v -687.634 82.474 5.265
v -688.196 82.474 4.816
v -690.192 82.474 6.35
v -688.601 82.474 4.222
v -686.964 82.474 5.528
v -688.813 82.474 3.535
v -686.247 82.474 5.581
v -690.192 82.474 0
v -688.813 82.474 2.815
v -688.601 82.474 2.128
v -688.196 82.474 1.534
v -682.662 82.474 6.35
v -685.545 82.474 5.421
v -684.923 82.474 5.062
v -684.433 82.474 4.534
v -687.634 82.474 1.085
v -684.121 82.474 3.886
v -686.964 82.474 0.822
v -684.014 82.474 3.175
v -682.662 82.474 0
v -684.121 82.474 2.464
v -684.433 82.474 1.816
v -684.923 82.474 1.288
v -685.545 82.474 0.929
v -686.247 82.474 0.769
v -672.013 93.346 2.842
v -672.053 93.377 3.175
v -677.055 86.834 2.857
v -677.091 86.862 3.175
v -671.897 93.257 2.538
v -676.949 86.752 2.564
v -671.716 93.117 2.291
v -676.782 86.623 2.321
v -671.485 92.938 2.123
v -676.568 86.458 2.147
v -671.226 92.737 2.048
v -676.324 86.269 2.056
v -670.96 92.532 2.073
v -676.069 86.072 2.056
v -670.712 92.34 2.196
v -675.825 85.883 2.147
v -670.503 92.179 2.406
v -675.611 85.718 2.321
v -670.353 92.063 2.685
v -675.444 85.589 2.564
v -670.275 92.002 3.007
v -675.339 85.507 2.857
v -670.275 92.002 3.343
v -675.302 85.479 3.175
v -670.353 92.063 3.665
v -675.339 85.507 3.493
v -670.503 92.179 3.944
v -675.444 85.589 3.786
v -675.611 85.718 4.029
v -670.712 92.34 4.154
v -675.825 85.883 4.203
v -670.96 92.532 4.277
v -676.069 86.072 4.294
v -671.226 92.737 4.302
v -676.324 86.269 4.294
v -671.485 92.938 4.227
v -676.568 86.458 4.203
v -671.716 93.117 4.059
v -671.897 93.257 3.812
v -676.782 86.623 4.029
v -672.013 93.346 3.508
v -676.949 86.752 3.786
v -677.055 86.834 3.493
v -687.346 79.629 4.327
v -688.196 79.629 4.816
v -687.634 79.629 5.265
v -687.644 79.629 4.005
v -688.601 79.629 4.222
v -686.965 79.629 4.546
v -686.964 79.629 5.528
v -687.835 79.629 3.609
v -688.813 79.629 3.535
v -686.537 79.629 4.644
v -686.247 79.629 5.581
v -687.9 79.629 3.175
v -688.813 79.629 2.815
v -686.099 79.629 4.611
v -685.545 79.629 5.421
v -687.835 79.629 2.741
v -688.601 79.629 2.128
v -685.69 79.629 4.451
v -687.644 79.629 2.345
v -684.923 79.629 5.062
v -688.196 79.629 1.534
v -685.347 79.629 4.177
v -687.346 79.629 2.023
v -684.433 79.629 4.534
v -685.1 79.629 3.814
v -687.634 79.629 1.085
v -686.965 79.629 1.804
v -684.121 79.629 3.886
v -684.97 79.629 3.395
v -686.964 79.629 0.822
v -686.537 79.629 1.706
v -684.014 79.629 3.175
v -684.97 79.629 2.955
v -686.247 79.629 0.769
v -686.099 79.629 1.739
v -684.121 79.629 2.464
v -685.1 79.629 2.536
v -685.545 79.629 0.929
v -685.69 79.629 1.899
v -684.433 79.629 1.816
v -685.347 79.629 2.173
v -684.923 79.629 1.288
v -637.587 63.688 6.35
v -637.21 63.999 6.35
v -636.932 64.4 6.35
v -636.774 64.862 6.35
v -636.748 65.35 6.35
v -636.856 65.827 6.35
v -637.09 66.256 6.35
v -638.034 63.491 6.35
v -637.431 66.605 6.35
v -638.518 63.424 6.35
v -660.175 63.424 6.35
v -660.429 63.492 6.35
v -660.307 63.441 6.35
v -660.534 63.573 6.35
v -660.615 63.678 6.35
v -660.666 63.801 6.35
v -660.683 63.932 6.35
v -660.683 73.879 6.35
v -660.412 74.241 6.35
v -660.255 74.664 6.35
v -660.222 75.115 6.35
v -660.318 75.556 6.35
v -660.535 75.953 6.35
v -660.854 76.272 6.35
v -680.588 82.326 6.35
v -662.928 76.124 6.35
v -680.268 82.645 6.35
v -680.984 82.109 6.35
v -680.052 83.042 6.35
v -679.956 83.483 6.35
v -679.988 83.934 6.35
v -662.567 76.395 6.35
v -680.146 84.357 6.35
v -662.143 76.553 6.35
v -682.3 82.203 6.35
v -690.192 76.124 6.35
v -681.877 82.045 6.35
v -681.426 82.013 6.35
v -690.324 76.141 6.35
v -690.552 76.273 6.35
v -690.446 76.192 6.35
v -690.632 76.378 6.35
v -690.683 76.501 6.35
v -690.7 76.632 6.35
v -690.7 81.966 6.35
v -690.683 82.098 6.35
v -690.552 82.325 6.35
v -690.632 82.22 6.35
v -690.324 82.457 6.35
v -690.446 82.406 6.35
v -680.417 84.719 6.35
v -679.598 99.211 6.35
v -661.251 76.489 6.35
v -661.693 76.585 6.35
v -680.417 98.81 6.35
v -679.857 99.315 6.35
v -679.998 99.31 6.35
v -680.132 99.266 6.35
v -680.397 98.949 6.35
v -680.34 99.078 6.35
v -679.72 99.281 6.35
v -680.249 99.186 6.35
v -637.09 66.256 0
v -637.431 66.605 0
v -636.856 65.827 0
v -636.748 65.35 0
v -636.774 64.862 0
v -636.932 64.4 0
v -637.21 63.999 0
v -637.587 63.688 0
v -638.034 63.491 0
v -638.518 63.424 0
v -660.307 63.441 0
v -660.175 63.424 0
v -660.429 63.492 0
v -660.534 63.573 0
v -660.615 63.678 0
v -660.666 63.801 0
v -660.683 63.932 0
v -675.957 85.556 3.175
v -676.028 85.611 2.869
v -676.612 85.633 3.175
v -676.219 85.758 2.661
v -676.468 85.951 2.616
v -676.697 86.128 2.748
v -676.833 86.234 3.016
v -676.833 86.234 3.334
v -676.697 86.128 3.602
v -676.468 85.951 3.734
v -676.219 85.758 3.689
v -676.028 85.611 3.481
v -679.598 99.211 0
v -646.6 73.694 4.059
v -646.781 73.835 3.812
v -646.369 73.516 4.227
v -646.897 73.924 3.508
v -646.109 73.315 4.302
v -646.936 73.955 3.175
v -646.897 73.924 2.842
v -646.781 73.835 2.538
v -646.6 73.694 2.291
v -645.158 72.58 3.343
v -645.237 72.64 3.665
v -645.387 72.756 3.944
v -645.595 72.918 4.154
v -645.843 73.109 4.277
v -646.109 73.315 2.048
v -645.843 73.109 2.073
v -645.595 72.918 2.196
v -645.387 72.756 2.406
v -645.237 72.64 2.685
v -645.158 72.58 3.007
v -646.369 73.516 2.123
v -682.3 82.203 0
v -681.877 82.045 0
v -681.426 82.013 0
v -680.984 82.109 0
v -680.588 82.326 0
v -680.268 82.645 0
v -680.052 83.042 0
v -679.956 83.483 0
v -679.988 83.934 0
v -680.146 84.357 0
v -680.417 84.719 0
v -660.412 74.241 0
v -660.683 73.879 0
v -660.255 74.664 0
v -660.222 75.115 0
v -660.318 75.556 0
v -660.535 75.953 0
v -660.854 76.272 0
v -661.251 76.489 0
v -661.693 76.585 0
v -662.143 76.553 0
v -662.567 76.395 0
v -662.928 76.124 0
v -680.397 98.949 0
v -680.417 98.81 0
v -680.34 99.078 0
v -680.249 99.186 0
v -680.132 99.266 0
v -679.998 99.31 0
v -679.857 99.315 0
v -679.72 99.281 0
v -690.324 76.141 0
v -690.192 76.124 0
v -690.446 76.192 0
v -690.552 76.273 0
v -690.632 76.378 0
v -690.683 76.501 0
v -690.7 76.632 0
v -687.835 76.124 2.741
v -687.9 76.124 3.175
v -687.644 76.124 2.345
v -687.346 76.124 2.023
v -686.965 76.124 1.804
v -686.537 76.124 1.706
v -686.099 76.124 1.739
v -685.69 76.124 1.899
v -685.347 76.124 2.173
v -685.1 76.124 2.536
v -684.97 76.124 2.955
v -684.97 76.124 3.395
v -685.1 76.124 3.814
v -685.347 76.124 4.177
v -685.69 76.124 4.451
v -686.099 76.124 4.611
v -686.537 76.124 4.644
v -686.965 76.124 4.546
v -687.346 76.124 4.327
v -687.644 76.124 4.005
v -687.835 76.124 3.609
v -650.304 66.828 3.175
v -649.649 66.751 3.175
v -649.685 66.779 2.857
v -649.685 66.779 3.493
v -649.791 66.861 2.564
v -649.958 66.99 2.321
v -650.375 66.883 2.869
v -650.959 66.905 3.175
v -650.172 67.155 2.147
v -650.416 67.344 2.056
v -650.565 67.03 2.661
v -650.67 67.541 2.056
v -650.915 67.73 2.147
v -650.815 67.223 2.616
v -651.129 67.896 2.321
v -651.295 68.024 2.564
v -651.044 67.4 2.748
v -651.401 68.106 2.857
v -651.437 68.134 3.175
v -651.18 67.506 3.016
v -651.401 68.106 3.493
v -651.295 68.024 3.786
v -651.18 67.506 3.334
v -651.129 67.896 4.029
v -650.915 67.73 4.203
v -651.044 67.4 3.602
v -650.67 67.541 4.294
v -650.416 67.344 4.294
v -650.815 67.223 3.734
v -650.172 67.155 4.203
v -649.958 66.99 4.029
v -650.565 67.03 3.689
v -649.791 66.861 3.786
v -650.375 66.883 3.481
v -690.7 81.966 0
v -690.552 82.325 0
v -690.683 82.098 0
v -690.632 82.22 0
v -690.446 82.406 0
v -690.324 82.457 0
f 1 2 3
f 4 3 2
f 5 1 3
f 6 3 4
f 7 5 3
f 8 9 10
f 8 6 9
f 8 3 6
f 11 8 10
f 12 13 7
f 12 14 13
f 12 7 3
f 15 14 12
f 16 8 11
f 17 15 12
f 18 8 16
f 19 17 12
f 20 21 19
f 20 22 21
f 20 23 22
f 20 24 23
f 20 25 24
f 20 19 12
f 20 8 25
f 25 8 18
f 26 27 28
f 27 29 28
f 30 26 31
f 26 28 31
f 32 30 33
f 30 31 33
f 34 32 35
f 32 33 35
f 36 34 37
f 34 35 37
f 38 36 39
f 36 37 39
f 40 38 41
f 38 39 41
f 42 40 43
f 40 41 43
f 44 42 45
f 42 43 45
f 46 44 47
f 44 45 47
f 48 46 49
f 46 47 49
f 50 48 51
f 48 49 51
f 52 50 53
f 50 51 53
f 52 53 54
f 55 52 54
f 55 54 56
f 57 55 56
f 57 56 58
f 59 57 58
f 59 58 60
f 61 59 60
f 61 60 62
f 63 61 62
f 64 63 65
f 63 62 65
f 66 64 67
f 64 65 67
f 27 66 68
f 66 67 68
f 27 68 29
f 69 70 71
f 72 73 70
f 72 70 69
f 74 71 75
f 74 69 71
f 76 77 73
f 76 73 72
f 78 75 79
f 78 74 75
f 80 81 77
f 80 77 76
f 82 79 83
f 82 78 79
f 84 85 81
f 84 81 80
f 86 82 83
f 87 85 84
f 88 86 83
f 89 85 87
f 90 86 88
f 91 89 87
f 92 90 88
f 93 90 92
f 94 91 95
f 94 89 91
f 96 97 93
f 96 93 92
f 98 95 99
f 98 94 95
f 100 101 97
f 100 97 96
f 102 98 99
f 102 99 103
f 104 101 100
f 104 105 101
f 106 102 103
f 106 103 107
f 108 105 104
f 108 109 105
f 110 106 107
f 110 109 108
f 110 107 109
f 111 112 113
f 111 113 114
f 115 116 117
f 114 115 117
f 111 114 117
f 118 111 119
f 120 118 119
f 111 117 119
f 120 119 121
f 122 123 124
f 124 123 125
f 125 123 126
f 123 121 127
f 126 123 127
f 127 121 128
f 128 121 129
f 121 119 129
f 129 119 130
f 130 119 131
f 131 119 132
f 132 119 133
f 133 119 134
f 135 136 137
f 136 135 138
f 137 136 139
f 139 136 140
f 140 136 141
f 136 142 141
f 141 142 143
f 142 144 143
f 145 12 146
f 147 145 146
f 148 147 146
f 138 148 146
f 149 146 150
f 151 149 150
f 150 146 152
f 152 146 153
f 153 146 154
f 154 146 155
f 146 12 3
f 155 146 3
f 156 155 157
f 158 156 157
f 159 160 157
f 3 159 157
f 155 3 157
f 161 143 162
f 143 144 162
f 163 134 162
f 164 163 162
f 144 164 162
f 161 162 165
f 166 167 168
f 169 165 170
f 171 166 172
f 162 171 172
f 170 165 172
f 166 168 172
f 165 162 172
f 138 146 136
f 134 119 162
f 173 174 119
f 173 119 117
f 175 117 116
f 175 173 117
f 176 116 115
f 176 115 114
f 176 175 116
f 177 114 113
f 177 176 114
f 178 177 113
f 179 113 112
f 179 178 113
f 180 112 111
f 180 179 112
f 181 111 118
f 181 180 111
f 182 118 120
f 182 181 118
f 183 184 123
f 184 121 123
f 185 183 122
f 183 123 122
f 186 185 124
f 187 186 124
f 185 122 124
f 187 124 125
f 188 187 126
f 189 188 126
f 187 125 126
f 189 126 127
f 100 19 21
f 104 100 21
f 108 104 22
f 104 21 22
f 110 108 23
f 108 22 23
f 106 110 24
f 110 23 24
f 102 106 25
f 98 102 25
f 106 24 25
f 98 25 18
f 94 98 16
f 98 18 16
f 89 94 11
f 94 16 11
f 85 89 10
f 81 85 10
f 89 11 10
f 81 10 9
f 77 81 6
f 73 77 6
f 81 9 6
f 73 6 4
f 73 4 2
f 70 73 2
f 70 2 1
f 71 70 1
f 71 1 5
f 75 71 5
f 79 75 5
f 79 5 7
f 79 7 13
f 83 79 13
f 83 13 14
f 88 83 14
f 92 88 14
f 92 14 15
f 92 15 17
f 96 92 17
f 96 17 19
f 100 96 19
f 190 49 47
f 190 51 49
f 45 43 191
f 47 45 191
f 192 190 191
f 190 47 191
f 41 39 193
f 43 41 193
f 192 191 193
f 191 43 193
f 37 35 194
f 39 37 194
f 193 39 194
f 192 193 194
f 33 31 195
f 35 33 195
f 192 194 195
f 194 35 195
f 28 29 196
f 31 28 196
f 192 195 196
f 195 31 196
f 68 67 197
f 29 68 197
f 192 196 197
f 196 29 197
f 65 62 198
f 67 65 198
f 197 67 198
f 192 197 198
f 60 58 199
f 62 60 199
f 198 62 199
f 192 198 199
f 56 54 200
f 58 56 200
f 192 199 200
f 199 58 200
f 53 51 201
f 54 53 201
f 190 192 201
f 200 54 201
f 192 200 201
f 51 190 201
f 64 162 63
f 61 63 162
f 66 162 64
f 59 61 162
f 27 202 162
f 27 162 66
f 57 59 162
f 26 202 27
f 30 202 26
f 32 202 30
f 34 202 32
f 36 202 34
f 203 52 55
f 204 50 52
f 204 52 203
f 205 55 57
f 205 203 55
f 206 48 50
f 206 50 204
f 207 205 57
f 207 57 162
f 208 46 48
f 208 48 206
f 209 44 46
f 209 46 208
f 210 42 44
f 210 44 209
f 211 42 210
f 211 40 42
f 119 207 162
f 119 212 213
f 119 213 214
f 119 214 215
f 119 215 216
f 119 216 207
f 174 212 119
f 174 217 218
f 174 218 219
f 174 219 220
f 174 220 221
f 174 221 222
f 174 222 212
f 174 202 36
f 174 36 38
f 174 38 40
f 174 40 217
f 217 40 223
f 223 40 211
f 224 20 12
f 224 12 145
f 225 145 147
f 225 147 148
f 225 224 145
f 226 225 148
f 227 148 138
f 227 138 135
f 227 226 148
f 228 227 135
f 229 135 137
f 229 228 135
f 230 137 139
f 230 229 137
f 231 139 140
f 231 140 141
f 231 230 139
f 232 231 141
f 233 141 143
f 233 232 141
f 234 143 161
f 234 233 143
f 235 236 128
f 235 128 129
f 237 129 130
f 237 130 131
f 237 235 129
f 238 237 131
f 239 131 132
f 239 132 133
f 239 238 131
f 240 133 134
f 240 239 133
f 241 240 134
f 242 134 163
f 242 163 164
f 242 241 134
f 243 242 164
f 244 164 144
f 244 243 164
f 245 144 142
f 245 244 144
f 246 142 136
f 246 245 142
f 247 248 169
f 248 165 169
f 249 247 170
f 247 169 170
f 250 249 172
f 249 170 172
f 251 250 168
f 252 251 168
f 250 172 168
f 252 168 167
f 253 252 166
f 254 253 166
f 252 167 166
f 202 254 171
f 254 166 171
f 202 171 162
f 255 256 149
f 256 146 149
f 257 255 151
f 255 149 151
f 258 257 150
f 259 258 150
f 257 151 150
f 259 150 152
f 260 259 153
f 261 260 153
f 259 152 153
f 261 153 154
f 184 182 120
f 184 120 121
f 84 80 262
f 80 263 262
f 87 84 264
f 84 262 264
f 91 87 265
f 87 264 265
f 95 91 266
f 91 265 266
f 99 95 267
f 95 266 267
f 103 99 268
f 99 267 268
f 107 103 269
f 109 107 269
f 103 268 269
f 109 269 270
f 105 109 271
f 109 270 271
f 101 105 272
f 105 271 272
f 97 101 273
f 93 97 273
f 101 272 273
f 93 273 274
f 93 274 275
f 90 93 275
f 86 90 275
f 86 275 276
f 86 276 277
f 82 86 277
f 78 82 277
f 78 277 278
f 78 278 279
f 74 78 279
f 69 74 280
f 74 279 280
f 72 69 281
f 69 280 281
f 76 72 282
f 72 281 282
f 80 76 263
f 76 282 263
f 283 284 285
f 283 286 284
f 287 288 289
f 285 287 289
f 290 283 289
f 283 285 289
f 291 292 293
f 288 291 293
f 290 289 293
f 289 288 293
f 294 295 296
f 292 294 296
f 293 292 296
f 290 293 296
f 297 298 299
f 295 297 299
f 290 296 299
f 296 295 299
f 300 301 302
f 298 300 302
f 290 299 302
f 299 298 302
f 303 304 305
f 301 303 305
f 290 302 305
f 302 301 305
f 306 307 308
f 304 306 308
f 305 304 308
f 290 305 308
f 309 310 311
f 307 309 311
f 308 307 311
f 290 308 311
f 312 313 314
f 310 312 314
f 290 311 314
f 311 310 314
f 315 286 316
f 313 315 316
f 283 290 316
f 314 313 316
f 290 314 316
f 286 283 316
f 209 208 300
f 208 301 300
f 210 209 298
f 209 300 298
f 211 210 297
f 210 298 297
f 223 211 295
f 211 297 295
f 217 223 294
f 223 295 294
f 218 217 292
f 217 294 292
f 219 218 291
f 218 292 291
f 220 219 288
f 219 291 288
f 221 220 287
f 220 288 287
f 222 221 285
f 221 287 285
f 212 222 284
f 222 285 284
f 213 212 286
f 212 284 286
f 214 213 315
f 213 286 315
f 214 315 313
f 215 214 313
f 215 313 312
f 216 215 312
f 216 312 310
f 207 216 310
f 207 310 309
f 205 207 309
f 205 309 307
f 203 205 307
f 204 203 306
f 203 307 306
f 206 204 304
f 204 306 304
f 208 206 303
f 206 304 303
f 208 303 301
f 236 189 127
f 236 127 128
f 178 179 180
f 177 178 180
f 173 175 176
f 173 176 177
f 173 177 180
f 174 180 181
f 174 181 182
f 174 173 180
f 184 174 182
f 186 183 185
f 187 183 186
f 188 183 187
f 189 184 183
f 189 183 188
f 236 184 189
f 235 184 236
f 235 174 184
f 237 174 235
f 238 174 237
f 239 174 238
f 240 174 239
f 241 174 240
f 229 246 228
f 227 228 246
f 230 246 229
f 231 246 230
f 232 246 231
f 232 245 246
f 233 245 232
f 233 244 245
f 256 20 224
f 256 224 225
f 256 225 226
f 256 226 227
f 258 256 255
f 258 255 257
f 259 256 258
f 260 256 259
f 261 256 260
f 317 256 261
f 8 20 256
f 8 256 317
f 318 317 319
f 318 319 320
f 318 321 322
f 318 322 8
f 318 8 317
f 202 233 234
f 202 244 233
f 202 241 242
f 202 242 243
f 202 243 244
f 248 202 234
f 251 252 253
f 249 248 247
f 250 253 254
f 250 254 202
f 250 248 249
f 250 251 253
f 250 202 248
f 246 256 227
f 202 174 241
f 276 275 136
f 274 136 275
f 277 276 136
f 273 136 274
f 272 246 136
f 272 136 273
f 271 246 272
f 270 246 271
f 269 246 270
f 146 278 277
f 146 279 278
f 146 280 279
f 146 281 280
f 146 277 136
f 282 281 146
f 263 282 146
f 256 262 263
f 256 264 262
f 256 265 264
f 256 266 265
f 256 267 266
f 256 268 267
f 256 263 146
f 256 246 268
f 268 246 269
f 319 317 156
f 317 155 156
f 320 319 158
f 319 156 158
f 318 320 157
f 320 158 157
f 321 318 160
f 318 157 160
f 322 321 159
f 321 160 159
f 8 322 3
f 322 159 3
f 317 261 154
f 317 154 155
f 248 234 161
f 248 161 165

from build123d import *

# Parameters (mm, degrees)
BOSS_EXTRUDE1_DEPTH                            = 6.35
FILLET1_R                                      = 0.508
CBORE_FOR_4_SOCKET_HEAD_CAP_SCREW1_D           = 2.9464
CBORE_FOR_4_SOCKET_HEAD_CAP_SCREW1_CBORE_D     = 4.826
CBORE_FOR_4_SOCKET_HEAD_CAP_SCREW1_CBORE_DEPTH = 2.8448
TAP_DRILL_FOR_4_40_TAP1_D                      = 2.2606
TAP_DRILL_FOR_4_40_TAP1_DEPTH                  = 7.357911993
TAP_DRILL_FOR_4_40_TAP1_TIP                    = 0.679152758
TAP_DRILL_FOR_4_40_TAP2_D                      = 2.2606
TAP_DRILL_FOR_4_40_TAP2_DEPTH                  = 8.235563733
TAP_DRILL_FOR_4_40_TAP2_TIP                    = 0.679152758


with BuildPart() as part:
    # Model → Boss-Extrude1 (new body)
    with BuildSketch(Plane.XY):
        with BuildLine():
            Line((-662.928291328, 76.124043703), (-690.700357042, 76.124043703))
            Line((-690.700357042, 76.124043703), (-690.700357042, 82.474043703))
            Line((-690.700357042, 82.474043703), (-682.661678057, 82.474043703))
            ThreePointArc((-682.661678057, 82.474043703), (-680.416614026, 82.474043703), (-680.416614026, 84.719107734))
            Line((-680.416614026, 84.719107734), (-680.416614026, 99.844571929))
            Line((-680.416614026, 99.844571929), (-637.431275221, 66.6046705))
            ThreePointArc((-637.431275221, 66.6046705), (-636.837083068, 64.625922801), (-638.517578145, 63.42407295))
            Line((-638.517578145, 63.42407295), (-660.683227297, 63.42407295))
            Line((-660.683227297, 63.42407295), (-660.683227297, 73.878979673))
            ThreePointArc((-660.683227297, 73.878979673), (-660.683227297, 76.124043703), (-662.928291328, 76.124043703))
        make_face()
    extrude(amount=BOSS_EXTRUDE1_DEPTH)

    # Fillet1
    fillet1_edges = [part.edges().sort_by_distance(p)[0] for p in [
        (-690.700357042, 76.124043703, 3.175),
        (-690.700357042, 82.474043703, 3.175),
        (-680.416614026, 99.844571929, 3.175),
        (-660.683227297, 63.42407295, 3.175),
    ]]
    fillet(fillet1_edges, radius=FILLET1_R)

    # CBORE for #4 Socket Head Cap Screw1 (through all)
    with Locations(Plane(origin=(0, 82.474043703, 0), x_dir=(1, 0, 0), z_dir=(0, 1, 0))):
        with Locations((-686.427017549, -3.175)):
            CounterBoreHole(CBORE_FOR_4_SOCKET_HEAD_CAP_SCREW1_D / 2, CBORE_FOR_4_SOCKET_HEAD_CAP_SCREW1_CBORE_D / 2, CBORE_FOR_4_SOCKET_HEAD_CAP_SCREW1_CBORE_DEPTH)

    # Tap Drill for #4-40 Tap1
    with Locations(Plane(origin=(-206.299258714, -266.783087499, 0), x_dir=(0.7910716317479708, -0.6117235269659022, 0), z_dir=(0.6117235269659022, 0.7910716317479708, 0))):
        with Locations((-555.88255935, -3.175)):
            Hole(TAP_DRILL_FOR_4_40_TAP1_D / 2, depth=TAP_DRILL_FOR_4_40_TAP1_DEPTH)
            with Locations((0, 0, -(TAP_DRILL_FOR_4_40_TAP1_DEPTH + TAP_DRILL_FOR_4_40_TAP1_TIP / 2))):  # 118° drill point
                Cone(0, TAP_DRILL_FOR_4_40_TAP1_D / 2, TAP_DRILL_FOR_4_40_TAP1_TIP, mode=Mode.SUBTRACT)

    # Tap Drill for #4-40 Tap2
    with Locations(Plane(origin=(-206.299258714, -266.783087499, 0), x_dir=(0.7910716317479708, -0.6117235269659022, 0), z_dir=(0.6117235269659022, 0.7910716317479708, 0))):
        with Locations((-587.63255935, -3.175)):
            Hole(TAP_DRILL_FOR_4_40_TAP2_D / 2, depth=TAP_DRILL_FOR_4_40_TAP2_DEPTH)
            with Locations((0, 0, -(TAP_DRILL_FOR_4_40_TAP2_DEPTH + TAP_DRILL_FOR_4_40_TAP2_TIP / 2))):  # 118° drill point
                Cone(0, TAP_DRILL_FOR_4_40_TAP2_D / 2, TAP_DRILL_FOR_4_40_TAP2_TIP, mode=Mode.SUBTRACT)


solid = part.part
